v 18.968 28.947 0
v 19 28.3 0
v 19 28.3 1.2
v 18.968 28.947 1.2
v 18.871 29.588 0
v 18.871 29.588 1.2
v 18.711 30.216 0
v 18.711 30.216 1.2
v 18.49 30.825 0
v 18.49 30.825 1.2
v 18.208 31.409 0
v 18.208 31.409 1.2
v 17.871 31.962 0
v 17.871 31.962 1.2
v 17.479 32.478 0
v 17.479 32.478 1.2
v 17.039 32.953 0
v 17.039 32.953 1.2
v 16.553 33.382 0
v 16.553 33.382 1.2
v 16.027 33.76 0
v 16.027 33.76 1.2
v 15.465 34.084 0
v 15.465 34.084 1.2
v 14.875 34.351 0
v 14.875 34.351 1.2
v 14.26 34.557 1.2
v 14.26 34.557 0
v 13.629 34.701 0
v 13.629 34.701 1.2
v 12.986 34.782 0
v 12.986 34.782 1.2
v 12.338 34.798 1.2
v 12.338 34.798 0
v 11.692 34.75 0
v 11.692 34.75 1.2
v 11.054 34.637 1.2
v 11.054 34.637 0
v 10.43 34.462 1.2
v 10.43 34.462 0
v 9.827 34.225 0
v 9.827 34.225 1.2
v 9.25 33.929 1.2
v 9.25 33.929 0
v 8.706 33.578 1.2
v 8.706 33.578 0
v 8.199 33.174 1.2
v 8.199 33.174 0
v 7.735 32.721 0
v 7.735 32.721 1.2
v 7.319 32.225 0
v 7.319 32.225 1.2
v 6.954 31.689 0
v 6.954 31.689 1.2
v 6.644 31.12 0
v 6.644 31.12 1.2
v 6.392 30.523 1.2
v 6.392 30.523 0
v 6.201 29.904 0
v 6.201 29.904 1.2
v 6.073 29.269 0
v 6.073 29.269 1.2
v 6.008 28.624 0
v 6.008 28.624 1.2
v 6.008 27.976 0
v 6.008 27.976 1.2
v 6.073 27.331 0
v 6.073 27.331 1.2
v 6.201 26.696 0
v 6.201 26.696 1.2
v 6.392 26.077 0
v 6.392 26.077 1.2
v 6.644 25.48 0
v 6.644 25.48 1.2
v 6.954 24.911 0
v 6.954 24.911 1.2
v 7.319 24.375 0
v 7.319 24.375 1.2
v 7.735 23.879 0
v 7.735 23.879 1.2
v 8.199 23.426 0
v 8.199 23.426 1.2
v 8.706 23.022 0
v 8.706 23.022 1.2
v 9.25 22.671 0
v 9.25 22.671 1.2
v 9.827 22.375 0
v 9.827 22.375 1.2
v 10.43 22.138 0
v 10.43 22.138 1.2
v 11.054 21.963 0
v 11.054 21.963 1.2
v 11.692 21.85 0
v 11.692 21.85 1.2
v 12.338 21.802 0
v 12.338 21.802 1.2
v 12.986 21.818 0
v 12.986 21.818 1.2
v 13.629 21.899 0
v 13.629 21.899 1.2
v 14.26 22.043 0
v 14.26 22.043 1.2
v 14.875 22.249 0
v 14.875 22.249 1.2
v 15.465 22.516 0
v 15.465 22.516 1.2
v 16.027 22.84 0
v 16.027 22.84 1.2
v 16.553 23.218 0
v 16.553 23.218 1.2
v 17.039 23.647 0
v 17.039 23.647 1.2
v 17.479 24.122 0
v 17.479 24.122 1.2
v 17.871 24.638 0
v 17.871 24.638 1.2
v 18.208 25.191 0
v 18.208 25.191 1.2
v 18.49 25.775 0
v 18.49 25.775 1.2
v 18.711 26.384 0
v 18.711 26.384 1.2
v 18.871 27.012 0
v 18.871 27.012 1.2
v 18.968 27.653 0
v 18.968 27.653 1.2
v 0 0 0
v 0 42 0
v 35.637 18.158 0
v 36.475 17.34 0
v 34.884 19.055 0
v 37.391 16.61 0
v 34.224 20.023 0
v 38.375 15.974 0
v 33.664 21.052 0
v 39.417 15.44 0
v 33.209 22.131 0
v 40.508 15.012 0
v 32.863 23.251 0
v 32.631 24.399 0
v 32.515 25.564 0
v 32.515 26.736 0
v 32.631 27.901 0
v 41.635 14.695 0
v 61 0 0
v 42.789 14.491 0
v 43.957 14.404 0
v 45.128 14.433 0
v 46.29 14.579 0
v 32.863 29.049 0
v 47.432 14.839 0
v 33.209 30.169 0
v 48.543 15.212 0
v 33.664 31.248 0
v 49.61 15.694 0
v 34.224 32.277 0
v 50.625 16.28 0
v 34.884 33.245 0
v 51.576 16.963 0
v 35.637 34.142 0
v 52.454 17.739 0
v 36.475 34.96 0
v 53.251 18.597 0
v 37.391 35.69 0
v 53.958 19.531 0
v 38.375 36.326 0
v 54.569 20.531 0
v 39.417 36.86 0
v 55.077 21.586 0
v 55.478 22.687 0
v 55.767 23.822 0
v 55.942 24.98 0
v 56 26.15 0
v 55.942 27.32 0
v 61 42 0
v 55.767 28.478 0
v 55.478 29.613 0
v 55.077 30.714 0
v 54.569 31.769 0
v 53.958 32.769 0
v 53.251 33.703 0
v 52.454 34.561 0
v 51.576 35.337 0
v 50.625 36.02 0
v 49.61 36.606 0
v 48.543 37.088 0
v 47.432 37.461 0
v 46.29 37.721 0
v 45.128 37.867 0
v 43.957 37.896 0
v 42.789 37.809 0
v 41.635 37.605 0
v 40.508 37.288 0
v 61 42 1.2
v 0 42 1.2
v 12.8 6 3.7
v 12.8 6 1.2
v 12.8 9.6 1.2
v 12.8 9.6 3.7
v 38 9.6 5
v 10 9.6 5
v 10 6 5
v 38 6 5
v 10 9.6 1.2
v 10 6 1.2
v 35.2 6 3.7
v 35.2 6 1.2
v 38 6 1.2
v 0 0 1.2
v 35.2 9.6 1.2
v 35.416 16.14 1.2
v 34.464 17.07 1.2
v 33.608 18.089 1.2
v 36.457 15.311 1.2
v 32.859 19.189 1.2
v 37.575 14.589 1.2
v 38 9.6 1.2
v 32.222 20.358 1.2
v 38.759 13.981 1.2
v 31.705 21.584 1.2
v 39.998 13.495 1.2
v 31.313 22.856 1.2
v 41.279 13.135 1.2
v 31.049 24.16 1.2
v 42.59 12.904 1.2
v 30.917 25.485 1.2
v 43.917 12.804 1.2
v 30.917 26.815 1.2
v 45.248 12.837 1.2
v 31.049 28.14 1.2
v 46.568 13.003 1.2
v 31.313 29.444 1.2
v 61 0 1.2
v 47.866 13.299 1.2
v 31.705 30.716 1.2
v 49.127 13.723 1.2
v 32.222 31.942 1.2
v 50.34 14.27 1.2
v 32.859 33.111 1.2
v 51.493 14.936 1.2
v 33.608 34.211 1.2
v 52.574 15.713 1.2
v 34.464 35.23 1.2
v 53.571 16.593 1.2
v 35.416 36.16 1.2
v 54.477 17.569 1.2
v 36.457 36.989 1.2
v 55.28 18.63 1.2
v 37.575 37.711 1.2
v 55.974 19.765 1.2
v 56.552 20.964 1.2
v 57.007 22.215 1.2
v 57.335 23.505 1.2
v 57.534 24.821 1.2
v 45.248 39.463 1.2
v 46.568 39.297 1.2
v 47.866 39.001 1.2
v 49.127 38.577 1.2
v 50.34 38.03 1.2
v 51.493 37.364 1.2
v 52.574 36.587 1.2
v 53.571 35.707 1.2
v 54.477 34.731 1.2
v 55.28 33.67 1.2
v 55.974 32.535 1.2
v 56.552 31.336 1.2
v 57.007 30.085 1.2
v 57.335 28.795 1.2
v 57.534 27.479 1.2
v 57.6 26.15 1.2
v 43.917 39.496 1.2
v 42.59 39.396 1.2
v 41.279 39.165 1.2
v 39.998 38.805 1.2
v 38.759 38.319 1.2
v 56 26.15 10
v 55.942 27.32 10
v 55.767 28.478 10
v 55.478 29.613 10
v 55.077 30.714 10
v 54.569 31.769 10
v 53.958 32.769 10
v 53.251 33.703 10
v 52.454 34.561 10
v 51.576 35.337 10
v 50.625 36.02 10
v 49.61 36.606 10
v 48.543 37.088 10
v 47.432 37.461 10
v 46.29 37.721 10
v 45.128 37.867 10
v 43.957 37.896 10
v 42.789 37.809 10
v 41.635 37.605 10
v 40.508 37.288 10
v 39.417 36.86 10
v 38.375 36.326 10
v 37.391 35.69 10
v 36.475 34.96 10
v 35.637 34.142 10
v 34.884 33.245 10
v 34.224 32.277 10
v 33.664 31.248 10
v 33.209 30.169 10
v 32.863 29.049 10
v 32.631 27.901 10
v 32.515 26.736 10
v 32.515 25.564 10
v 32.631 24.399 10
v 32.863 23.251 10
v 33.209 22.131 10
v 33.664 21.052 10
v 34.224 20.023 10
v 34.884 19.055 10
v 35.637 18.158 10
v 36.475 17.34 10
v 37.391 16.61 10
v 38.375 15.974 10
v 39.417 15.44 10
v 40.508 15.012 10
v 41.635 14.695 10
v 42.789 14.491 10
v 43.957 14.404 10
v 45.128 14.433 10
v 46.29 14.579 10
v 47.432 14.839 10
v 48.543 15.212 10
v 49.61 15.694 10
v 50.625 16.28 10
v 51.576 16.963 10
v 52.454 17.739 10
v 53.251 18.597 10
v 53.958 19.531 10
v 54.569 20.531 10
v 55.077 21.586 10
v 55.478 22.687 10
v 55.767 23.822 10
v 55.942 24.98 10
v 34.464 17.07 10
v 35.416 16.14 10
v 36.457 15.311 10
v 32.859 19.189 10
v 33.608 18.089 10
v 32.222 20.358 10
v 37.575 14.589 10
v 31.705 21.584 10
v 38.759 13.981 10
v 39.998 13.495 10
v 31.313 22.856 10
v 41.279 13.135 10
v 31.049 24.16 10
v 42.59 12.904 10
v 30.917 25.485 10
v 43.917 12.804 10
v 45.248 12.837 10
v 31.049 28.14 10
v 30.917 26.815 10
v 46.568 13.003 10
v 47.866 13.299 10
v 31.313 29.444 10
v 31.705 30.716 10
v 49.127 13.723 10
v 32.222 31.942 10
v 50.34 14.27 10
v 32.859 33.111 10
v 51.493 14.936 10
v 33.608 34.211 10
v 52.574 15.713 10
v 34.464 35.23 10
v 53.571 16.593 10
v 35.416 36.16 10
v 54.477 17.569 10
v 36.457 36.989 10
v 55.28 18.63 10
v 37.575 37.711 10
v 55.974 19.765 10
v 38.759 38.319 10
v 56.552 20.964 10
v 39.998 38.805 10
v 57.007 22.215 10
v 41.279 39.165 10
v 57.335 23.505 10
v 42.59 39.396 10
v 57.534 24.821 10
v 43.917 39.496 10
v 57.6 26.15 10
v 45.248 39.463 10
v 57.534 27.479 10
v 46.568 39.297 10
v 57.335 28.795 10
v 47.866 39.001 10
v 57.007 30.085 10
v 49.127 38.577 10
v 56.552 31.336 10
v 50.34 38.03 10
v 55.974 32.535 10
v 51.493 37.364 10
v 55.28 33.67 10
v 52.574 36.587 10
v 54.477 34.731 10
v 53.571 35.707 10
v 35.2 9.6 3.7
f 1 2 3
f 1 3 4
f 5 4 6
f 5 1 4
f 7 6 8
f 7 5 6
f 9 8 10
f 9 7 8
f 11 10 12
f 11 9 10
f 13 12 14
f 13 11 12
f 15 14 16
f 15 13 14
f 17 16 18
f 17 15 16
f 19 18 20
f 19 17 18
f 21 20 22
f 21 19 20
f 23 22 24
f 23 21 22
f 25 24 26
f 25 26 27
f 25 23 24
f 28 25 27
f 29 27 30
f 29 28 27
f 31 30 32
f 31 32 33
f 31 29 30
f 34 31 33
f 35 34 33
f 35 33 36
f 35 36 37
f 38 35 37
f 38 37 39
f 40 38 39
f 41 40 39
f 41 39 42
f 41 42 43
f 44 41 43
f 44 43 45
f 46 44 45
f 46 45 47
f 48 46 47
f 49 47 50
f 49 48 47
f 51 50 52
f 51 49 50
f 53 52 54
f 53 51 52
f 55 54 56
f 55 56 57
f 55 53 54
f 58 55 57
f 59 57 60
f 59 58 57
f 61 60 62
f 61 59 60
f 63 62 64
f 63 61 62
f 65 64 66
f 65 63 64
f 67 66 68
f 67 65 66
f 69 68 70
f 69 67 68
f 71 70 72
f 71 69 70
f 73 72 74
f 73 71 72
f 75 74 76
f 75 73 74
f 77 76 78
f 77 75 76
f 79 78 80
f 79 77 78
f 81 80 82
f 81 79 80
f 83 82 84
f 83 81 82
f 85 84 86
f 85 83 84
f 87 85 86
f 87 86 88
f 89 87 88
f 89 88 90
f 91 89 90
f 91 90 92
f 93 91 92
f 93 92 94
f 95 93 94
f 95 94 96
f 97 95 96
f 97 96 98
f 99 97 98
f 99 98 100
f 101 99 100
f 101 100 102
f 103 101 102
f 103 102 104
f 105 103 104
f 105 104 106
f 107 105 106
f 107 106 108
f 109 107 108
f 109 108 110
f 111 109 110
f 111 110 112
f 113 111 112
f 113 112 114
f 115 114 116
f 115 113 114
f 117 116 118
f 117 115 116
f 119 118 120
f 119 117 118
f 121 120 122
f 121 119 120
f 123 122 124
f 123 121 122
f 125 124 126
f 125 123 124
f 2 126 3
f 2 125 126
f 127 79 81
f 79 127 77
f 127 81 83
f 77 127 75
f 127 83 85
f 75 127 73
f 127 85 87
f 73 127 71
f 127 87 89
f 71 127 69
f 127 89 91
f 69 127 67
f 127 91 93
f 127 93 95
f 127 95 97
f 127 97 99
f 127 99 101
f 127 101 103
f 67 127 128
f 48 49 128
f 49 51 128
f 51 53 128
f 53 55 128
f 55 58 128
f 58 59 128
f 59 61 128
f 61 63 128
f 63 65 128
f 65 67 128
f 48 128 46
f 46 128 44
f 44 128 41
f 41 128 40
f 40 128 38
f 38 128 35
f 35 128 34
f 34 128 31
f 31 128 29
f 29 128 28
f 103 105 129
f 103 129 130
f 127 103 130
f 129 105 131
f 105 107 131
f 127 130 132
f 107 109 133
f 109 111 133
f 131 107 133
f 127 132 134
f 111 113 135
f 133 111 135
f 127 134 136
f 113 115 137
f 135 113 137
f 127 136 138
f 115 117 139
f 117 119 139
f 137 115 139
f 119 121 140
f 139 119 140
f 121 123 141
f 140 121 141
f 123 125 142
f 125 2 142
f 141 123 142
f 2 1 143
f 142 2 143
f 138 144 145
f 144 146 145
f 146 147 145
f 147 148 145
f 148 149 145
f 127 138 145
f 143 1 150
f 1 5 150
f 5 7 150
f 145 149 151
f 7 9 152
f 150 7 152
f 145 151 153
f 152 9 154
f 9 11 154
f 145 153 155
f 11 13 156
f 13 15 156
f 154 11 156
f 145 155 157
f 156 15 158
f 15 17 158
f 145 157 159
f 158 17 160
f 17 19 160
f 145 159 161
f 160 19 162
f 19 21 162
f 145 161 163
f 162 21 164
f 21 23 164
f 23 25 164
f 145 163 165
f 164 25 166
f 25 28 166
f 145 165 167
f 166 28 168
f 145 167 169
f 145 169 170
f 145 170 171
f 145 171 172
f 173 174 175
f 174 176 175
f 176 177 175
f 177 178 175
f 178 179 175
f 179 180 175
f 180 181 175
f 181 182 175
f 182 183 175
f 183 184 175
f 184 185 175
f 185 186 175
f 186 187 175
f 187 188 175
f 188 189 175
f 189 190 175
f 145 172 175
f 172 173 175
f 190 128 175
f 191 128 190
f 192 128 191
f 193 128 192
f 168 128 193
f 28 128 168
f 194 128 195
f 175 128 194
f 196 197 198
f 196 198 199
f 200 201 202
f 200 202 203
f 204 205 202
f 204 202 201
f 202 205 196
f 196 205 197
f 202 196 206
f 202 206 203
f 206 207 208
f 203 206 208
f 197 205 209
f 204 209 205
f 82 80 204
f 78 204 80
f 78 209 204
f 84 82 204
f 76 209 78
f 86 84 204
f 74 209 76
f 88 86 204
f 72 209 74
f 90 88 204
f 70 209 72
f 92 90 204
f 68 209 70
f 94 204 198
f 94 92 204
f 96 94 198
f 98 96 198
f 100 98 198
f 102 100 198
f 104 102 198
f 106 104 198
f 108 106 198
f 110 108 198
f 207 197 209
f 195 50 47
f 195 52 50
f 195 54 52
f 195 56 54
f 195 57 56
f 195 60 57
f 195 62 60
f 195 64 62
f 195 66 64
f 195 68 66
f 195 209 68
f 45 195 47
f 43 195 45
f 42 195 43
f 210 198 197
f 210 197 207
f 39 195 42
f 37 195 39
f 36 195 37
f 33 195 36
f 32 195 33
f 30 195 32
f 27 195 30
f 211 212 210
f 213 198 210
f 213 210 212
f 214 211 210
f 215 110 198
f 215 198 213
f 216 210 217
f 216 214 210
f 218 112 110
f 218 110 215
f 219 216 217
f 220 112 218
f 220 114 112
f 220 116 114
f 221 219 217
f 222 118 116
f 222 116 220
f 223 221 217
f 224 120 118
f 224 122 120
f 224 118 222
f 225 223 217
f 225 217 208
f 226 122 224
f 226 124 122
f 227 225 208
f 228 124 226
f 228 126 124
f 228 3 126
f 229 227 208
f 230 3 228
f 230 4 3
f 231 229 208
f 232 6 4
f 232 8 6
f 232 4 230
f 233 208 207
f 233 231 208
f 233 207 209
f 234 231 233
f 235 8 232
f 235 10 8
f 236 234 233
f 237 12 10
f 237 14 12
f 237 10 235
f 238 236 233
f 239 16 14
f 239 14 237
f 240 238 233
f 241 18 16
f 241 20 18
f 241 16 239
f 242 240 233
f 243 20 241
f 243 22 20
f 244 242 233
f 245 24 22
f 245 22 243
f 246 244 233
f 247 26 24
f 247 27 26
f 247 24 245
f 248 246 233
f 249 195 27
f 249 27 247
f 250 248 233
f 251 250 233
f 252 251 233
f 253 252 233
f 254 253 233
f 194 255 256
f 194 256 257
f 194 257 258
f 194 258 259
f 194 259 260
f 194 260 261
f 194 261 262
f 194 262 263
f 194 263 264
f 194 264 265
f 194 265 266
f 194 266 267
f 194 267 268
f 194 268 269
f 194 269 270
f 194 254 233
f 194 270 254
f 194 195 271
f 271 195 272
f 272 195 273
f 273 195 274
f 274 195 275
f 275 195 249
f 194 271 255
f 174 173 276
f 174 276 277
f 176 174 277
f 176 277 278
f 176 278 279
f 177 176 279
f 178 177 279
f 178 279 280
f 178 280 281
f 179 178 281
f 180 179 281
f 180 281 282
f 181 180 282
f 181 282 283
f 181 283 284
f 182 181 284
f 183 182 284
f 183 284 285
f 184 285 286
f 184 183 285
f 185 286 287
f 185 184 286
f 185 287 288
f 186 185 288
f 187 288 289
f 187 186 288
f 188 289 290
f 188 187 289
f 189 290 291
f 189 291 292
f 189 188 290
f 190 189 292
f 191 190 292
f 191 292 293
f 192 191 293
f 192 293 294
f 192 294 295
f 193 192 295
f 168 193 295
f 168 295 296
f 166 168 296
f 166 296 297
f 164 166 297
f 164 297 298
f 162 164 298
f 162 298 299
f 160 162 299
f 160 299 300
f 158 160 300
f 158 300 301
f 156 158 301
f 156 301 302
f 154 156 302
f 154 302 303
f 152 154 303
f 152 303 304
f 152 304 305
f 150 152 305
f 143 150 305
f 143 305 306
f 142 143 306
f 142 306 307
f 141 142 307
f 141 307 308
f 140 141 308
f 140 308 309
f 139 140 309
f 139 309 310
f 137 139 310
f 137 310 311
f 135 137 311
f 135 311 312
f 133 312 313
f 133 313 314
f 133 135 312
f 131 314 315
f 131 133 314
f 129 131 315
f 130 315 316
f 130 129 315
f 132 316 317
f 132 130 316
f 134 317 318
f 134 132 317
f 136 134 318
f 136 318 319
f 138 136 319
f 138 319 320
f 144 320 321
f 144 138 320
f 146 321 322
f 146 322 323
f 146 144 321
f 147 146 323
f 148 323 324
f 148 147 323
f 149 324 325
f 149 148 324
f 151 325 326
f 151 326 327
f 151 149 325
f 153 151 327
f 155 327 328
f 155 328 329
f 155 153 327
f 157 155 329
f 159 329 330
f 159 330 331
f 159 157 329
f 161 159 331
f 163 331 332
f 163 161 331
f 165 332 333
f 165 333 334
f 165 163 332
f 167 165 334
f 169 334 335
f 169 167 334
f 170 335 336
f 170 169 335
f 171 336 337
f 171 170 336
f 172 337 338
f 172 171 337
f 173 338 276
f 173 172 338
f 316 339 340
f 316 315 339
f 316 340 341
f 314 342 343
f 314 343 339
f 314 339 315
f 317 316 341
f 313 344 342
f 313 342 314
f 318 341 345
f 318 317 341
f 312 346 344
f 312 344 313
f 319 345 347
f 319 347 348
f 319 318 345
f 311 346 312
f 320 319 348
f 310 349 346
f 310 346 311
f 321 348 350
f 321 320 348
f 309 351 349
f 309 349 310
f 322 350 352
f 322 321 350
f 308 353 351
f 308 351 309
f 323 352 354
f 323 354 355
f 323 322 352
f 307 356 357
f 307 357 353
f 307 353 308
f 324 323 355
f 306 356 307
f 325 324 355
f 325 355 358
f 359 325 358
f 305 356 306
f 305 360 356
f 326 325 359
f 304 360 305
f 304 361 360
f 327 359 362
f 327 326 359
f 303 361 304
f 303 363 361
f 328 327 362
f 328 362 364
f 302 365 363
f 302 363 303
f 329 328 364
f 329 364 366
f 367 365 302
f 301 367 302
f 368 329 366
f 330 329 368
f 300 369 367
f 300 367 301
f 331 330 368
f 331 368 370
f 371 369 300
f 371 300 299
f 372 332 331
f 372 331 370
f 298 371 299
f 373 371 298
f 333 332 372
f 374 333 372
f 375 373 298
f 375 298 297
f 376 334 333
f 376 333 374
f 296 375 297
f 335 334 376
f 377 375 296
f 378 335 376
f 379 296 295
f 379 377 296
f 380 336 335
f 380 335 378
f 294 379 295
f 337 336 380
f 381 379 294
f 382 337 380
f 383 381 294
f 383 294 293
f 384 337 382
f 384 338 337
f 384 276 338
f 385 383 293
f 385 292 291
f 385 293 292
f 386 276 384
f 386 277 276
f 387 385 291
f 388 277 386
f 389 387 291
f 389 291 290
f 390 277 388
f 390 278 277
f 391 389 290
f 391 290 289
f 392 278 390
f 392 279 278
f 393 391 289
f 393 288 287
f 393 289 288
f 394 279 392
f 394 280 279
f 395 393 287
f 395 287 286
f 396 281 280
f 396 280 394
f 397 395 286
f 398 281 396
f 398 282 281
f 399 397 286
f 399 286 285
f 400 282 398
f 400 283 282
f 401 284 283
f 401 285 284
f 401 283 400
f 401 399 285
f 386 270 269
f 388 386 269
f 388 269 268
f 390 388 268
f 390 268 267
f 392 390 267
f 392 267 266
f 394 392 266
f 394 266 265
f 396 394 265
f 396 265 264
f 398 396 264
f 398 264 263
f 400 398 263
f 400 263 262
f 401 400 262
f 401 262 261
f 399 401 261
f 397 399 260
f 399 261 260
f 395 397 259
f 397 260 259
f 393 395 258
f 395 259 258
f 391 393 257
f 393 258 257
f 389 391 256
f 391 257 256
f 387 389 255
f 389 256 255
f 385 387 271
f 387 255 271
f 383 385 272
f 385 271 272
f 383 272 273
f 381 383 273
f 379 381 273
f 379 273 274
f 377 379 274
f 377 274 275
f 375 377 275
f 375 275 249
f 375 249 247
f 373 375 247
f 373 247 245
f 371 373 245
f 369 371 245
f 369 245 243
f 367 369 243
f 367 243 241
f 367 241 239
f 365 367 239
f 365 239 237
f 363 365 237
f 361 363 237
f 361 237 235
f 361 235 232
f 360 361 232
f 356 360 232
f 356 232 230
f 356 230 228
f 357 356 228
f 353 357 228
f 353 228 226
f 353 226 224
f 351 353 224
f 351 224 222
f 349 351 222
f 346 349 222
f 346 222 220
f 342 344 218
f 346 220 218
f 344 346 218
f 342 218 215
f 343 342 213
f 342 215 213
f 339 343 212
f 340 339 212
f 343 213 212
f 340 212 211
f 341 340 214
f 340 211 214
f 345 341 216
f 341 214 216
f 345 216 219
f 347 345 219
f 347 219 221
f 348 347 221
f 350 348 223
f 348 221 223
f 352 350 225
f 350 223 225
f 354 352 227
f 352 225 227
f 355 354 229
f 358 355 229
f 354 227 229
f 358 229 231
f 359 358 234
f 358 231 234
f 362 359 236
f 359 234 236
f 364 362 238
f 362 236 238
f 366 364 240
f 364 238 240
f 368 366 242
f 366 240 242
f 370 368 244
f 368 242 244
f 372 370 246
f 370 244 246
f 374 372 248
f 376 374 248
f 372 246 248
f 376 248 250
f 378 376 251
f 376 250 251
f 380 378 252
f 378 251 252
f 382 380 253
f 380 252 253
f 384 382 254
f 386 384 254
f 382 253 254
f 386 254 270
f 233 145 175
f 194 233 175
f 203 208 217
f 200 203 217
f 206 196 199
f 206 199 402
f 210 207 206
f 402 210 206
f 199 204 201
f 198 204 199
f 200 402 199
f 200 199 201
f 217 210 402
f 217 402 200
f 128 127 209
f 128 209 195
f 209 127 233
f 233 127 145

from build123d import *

# Parameters (mm, degrees)
F0_W     = 61
F0_H     = 42
F0_W_2   = 28
F0_H_2   = 3.6
F0_R     = 6.5
F0_R_2   = 13.35
F0_R_3   = 11.75
F1_DEPTH = 1.2
F2_DEPTH = 10
F3_DEPTH = 5
F4_W     = 22.4
F4_H     = 2.5
F5_DEPTH = 5


with BuildPart() as f1:
    # F0 (on Top) → F1 (new body)
    with BuildSketch(Plane.XY):
        with Locations((30.5, 21)):
            Rectangle(F0_W, F0_H)
        with Locations((24, 7.8)):
            Rectangle(F0_W_2, F0_H_2, mode=Mode.SUBTRACT)
        with Locations((12.5, 28.3)):
            Circle(F0_R, mode=Mode.SUBTRACT)
        with Locations((44.25, 26.15)):
            Circle(F0_R_2, mode=Mode.SUBTRACT)
        with Locations((44.25, 26.15)):
            Circle(F0_R_2)
        with Locations((44.25, 26.15)):
            Circle(F0_R_3, mode=Mode.SUBTRACT)
    extrude(amount=F1_DEPTH)

    # F0 (on Top) → F2 (join)
    with BuildSketch(Plane.XY):
        with Locations((44.25, 26.15)):
            Circle(F0_R_2)
        with Locations((44.25, 26.15)):
            Circle(F0_R_3, mode=Mode.SUBTRACT)
    extrude(amount=F2_DEPTH)

    # F0 (on Top) → F3 (join)
    with BuildSketch(Plane.XY):
        with Locations((24, 7.8)):
            Rectangle(F0_W_2, F0_H_2)
    extrude(amount=F3_DEPTH)

    # F4 (on face) → F5 (cut)
    with BuildSketch(Plane.XZ.offset(-6)):
        with Locations((24, 2.45)):
            Rectangle(F4_W, F4_H)
    extrude(amount=-F5_DEPTH, mode=Mode.SUBTRACT)


solid = f1.part
